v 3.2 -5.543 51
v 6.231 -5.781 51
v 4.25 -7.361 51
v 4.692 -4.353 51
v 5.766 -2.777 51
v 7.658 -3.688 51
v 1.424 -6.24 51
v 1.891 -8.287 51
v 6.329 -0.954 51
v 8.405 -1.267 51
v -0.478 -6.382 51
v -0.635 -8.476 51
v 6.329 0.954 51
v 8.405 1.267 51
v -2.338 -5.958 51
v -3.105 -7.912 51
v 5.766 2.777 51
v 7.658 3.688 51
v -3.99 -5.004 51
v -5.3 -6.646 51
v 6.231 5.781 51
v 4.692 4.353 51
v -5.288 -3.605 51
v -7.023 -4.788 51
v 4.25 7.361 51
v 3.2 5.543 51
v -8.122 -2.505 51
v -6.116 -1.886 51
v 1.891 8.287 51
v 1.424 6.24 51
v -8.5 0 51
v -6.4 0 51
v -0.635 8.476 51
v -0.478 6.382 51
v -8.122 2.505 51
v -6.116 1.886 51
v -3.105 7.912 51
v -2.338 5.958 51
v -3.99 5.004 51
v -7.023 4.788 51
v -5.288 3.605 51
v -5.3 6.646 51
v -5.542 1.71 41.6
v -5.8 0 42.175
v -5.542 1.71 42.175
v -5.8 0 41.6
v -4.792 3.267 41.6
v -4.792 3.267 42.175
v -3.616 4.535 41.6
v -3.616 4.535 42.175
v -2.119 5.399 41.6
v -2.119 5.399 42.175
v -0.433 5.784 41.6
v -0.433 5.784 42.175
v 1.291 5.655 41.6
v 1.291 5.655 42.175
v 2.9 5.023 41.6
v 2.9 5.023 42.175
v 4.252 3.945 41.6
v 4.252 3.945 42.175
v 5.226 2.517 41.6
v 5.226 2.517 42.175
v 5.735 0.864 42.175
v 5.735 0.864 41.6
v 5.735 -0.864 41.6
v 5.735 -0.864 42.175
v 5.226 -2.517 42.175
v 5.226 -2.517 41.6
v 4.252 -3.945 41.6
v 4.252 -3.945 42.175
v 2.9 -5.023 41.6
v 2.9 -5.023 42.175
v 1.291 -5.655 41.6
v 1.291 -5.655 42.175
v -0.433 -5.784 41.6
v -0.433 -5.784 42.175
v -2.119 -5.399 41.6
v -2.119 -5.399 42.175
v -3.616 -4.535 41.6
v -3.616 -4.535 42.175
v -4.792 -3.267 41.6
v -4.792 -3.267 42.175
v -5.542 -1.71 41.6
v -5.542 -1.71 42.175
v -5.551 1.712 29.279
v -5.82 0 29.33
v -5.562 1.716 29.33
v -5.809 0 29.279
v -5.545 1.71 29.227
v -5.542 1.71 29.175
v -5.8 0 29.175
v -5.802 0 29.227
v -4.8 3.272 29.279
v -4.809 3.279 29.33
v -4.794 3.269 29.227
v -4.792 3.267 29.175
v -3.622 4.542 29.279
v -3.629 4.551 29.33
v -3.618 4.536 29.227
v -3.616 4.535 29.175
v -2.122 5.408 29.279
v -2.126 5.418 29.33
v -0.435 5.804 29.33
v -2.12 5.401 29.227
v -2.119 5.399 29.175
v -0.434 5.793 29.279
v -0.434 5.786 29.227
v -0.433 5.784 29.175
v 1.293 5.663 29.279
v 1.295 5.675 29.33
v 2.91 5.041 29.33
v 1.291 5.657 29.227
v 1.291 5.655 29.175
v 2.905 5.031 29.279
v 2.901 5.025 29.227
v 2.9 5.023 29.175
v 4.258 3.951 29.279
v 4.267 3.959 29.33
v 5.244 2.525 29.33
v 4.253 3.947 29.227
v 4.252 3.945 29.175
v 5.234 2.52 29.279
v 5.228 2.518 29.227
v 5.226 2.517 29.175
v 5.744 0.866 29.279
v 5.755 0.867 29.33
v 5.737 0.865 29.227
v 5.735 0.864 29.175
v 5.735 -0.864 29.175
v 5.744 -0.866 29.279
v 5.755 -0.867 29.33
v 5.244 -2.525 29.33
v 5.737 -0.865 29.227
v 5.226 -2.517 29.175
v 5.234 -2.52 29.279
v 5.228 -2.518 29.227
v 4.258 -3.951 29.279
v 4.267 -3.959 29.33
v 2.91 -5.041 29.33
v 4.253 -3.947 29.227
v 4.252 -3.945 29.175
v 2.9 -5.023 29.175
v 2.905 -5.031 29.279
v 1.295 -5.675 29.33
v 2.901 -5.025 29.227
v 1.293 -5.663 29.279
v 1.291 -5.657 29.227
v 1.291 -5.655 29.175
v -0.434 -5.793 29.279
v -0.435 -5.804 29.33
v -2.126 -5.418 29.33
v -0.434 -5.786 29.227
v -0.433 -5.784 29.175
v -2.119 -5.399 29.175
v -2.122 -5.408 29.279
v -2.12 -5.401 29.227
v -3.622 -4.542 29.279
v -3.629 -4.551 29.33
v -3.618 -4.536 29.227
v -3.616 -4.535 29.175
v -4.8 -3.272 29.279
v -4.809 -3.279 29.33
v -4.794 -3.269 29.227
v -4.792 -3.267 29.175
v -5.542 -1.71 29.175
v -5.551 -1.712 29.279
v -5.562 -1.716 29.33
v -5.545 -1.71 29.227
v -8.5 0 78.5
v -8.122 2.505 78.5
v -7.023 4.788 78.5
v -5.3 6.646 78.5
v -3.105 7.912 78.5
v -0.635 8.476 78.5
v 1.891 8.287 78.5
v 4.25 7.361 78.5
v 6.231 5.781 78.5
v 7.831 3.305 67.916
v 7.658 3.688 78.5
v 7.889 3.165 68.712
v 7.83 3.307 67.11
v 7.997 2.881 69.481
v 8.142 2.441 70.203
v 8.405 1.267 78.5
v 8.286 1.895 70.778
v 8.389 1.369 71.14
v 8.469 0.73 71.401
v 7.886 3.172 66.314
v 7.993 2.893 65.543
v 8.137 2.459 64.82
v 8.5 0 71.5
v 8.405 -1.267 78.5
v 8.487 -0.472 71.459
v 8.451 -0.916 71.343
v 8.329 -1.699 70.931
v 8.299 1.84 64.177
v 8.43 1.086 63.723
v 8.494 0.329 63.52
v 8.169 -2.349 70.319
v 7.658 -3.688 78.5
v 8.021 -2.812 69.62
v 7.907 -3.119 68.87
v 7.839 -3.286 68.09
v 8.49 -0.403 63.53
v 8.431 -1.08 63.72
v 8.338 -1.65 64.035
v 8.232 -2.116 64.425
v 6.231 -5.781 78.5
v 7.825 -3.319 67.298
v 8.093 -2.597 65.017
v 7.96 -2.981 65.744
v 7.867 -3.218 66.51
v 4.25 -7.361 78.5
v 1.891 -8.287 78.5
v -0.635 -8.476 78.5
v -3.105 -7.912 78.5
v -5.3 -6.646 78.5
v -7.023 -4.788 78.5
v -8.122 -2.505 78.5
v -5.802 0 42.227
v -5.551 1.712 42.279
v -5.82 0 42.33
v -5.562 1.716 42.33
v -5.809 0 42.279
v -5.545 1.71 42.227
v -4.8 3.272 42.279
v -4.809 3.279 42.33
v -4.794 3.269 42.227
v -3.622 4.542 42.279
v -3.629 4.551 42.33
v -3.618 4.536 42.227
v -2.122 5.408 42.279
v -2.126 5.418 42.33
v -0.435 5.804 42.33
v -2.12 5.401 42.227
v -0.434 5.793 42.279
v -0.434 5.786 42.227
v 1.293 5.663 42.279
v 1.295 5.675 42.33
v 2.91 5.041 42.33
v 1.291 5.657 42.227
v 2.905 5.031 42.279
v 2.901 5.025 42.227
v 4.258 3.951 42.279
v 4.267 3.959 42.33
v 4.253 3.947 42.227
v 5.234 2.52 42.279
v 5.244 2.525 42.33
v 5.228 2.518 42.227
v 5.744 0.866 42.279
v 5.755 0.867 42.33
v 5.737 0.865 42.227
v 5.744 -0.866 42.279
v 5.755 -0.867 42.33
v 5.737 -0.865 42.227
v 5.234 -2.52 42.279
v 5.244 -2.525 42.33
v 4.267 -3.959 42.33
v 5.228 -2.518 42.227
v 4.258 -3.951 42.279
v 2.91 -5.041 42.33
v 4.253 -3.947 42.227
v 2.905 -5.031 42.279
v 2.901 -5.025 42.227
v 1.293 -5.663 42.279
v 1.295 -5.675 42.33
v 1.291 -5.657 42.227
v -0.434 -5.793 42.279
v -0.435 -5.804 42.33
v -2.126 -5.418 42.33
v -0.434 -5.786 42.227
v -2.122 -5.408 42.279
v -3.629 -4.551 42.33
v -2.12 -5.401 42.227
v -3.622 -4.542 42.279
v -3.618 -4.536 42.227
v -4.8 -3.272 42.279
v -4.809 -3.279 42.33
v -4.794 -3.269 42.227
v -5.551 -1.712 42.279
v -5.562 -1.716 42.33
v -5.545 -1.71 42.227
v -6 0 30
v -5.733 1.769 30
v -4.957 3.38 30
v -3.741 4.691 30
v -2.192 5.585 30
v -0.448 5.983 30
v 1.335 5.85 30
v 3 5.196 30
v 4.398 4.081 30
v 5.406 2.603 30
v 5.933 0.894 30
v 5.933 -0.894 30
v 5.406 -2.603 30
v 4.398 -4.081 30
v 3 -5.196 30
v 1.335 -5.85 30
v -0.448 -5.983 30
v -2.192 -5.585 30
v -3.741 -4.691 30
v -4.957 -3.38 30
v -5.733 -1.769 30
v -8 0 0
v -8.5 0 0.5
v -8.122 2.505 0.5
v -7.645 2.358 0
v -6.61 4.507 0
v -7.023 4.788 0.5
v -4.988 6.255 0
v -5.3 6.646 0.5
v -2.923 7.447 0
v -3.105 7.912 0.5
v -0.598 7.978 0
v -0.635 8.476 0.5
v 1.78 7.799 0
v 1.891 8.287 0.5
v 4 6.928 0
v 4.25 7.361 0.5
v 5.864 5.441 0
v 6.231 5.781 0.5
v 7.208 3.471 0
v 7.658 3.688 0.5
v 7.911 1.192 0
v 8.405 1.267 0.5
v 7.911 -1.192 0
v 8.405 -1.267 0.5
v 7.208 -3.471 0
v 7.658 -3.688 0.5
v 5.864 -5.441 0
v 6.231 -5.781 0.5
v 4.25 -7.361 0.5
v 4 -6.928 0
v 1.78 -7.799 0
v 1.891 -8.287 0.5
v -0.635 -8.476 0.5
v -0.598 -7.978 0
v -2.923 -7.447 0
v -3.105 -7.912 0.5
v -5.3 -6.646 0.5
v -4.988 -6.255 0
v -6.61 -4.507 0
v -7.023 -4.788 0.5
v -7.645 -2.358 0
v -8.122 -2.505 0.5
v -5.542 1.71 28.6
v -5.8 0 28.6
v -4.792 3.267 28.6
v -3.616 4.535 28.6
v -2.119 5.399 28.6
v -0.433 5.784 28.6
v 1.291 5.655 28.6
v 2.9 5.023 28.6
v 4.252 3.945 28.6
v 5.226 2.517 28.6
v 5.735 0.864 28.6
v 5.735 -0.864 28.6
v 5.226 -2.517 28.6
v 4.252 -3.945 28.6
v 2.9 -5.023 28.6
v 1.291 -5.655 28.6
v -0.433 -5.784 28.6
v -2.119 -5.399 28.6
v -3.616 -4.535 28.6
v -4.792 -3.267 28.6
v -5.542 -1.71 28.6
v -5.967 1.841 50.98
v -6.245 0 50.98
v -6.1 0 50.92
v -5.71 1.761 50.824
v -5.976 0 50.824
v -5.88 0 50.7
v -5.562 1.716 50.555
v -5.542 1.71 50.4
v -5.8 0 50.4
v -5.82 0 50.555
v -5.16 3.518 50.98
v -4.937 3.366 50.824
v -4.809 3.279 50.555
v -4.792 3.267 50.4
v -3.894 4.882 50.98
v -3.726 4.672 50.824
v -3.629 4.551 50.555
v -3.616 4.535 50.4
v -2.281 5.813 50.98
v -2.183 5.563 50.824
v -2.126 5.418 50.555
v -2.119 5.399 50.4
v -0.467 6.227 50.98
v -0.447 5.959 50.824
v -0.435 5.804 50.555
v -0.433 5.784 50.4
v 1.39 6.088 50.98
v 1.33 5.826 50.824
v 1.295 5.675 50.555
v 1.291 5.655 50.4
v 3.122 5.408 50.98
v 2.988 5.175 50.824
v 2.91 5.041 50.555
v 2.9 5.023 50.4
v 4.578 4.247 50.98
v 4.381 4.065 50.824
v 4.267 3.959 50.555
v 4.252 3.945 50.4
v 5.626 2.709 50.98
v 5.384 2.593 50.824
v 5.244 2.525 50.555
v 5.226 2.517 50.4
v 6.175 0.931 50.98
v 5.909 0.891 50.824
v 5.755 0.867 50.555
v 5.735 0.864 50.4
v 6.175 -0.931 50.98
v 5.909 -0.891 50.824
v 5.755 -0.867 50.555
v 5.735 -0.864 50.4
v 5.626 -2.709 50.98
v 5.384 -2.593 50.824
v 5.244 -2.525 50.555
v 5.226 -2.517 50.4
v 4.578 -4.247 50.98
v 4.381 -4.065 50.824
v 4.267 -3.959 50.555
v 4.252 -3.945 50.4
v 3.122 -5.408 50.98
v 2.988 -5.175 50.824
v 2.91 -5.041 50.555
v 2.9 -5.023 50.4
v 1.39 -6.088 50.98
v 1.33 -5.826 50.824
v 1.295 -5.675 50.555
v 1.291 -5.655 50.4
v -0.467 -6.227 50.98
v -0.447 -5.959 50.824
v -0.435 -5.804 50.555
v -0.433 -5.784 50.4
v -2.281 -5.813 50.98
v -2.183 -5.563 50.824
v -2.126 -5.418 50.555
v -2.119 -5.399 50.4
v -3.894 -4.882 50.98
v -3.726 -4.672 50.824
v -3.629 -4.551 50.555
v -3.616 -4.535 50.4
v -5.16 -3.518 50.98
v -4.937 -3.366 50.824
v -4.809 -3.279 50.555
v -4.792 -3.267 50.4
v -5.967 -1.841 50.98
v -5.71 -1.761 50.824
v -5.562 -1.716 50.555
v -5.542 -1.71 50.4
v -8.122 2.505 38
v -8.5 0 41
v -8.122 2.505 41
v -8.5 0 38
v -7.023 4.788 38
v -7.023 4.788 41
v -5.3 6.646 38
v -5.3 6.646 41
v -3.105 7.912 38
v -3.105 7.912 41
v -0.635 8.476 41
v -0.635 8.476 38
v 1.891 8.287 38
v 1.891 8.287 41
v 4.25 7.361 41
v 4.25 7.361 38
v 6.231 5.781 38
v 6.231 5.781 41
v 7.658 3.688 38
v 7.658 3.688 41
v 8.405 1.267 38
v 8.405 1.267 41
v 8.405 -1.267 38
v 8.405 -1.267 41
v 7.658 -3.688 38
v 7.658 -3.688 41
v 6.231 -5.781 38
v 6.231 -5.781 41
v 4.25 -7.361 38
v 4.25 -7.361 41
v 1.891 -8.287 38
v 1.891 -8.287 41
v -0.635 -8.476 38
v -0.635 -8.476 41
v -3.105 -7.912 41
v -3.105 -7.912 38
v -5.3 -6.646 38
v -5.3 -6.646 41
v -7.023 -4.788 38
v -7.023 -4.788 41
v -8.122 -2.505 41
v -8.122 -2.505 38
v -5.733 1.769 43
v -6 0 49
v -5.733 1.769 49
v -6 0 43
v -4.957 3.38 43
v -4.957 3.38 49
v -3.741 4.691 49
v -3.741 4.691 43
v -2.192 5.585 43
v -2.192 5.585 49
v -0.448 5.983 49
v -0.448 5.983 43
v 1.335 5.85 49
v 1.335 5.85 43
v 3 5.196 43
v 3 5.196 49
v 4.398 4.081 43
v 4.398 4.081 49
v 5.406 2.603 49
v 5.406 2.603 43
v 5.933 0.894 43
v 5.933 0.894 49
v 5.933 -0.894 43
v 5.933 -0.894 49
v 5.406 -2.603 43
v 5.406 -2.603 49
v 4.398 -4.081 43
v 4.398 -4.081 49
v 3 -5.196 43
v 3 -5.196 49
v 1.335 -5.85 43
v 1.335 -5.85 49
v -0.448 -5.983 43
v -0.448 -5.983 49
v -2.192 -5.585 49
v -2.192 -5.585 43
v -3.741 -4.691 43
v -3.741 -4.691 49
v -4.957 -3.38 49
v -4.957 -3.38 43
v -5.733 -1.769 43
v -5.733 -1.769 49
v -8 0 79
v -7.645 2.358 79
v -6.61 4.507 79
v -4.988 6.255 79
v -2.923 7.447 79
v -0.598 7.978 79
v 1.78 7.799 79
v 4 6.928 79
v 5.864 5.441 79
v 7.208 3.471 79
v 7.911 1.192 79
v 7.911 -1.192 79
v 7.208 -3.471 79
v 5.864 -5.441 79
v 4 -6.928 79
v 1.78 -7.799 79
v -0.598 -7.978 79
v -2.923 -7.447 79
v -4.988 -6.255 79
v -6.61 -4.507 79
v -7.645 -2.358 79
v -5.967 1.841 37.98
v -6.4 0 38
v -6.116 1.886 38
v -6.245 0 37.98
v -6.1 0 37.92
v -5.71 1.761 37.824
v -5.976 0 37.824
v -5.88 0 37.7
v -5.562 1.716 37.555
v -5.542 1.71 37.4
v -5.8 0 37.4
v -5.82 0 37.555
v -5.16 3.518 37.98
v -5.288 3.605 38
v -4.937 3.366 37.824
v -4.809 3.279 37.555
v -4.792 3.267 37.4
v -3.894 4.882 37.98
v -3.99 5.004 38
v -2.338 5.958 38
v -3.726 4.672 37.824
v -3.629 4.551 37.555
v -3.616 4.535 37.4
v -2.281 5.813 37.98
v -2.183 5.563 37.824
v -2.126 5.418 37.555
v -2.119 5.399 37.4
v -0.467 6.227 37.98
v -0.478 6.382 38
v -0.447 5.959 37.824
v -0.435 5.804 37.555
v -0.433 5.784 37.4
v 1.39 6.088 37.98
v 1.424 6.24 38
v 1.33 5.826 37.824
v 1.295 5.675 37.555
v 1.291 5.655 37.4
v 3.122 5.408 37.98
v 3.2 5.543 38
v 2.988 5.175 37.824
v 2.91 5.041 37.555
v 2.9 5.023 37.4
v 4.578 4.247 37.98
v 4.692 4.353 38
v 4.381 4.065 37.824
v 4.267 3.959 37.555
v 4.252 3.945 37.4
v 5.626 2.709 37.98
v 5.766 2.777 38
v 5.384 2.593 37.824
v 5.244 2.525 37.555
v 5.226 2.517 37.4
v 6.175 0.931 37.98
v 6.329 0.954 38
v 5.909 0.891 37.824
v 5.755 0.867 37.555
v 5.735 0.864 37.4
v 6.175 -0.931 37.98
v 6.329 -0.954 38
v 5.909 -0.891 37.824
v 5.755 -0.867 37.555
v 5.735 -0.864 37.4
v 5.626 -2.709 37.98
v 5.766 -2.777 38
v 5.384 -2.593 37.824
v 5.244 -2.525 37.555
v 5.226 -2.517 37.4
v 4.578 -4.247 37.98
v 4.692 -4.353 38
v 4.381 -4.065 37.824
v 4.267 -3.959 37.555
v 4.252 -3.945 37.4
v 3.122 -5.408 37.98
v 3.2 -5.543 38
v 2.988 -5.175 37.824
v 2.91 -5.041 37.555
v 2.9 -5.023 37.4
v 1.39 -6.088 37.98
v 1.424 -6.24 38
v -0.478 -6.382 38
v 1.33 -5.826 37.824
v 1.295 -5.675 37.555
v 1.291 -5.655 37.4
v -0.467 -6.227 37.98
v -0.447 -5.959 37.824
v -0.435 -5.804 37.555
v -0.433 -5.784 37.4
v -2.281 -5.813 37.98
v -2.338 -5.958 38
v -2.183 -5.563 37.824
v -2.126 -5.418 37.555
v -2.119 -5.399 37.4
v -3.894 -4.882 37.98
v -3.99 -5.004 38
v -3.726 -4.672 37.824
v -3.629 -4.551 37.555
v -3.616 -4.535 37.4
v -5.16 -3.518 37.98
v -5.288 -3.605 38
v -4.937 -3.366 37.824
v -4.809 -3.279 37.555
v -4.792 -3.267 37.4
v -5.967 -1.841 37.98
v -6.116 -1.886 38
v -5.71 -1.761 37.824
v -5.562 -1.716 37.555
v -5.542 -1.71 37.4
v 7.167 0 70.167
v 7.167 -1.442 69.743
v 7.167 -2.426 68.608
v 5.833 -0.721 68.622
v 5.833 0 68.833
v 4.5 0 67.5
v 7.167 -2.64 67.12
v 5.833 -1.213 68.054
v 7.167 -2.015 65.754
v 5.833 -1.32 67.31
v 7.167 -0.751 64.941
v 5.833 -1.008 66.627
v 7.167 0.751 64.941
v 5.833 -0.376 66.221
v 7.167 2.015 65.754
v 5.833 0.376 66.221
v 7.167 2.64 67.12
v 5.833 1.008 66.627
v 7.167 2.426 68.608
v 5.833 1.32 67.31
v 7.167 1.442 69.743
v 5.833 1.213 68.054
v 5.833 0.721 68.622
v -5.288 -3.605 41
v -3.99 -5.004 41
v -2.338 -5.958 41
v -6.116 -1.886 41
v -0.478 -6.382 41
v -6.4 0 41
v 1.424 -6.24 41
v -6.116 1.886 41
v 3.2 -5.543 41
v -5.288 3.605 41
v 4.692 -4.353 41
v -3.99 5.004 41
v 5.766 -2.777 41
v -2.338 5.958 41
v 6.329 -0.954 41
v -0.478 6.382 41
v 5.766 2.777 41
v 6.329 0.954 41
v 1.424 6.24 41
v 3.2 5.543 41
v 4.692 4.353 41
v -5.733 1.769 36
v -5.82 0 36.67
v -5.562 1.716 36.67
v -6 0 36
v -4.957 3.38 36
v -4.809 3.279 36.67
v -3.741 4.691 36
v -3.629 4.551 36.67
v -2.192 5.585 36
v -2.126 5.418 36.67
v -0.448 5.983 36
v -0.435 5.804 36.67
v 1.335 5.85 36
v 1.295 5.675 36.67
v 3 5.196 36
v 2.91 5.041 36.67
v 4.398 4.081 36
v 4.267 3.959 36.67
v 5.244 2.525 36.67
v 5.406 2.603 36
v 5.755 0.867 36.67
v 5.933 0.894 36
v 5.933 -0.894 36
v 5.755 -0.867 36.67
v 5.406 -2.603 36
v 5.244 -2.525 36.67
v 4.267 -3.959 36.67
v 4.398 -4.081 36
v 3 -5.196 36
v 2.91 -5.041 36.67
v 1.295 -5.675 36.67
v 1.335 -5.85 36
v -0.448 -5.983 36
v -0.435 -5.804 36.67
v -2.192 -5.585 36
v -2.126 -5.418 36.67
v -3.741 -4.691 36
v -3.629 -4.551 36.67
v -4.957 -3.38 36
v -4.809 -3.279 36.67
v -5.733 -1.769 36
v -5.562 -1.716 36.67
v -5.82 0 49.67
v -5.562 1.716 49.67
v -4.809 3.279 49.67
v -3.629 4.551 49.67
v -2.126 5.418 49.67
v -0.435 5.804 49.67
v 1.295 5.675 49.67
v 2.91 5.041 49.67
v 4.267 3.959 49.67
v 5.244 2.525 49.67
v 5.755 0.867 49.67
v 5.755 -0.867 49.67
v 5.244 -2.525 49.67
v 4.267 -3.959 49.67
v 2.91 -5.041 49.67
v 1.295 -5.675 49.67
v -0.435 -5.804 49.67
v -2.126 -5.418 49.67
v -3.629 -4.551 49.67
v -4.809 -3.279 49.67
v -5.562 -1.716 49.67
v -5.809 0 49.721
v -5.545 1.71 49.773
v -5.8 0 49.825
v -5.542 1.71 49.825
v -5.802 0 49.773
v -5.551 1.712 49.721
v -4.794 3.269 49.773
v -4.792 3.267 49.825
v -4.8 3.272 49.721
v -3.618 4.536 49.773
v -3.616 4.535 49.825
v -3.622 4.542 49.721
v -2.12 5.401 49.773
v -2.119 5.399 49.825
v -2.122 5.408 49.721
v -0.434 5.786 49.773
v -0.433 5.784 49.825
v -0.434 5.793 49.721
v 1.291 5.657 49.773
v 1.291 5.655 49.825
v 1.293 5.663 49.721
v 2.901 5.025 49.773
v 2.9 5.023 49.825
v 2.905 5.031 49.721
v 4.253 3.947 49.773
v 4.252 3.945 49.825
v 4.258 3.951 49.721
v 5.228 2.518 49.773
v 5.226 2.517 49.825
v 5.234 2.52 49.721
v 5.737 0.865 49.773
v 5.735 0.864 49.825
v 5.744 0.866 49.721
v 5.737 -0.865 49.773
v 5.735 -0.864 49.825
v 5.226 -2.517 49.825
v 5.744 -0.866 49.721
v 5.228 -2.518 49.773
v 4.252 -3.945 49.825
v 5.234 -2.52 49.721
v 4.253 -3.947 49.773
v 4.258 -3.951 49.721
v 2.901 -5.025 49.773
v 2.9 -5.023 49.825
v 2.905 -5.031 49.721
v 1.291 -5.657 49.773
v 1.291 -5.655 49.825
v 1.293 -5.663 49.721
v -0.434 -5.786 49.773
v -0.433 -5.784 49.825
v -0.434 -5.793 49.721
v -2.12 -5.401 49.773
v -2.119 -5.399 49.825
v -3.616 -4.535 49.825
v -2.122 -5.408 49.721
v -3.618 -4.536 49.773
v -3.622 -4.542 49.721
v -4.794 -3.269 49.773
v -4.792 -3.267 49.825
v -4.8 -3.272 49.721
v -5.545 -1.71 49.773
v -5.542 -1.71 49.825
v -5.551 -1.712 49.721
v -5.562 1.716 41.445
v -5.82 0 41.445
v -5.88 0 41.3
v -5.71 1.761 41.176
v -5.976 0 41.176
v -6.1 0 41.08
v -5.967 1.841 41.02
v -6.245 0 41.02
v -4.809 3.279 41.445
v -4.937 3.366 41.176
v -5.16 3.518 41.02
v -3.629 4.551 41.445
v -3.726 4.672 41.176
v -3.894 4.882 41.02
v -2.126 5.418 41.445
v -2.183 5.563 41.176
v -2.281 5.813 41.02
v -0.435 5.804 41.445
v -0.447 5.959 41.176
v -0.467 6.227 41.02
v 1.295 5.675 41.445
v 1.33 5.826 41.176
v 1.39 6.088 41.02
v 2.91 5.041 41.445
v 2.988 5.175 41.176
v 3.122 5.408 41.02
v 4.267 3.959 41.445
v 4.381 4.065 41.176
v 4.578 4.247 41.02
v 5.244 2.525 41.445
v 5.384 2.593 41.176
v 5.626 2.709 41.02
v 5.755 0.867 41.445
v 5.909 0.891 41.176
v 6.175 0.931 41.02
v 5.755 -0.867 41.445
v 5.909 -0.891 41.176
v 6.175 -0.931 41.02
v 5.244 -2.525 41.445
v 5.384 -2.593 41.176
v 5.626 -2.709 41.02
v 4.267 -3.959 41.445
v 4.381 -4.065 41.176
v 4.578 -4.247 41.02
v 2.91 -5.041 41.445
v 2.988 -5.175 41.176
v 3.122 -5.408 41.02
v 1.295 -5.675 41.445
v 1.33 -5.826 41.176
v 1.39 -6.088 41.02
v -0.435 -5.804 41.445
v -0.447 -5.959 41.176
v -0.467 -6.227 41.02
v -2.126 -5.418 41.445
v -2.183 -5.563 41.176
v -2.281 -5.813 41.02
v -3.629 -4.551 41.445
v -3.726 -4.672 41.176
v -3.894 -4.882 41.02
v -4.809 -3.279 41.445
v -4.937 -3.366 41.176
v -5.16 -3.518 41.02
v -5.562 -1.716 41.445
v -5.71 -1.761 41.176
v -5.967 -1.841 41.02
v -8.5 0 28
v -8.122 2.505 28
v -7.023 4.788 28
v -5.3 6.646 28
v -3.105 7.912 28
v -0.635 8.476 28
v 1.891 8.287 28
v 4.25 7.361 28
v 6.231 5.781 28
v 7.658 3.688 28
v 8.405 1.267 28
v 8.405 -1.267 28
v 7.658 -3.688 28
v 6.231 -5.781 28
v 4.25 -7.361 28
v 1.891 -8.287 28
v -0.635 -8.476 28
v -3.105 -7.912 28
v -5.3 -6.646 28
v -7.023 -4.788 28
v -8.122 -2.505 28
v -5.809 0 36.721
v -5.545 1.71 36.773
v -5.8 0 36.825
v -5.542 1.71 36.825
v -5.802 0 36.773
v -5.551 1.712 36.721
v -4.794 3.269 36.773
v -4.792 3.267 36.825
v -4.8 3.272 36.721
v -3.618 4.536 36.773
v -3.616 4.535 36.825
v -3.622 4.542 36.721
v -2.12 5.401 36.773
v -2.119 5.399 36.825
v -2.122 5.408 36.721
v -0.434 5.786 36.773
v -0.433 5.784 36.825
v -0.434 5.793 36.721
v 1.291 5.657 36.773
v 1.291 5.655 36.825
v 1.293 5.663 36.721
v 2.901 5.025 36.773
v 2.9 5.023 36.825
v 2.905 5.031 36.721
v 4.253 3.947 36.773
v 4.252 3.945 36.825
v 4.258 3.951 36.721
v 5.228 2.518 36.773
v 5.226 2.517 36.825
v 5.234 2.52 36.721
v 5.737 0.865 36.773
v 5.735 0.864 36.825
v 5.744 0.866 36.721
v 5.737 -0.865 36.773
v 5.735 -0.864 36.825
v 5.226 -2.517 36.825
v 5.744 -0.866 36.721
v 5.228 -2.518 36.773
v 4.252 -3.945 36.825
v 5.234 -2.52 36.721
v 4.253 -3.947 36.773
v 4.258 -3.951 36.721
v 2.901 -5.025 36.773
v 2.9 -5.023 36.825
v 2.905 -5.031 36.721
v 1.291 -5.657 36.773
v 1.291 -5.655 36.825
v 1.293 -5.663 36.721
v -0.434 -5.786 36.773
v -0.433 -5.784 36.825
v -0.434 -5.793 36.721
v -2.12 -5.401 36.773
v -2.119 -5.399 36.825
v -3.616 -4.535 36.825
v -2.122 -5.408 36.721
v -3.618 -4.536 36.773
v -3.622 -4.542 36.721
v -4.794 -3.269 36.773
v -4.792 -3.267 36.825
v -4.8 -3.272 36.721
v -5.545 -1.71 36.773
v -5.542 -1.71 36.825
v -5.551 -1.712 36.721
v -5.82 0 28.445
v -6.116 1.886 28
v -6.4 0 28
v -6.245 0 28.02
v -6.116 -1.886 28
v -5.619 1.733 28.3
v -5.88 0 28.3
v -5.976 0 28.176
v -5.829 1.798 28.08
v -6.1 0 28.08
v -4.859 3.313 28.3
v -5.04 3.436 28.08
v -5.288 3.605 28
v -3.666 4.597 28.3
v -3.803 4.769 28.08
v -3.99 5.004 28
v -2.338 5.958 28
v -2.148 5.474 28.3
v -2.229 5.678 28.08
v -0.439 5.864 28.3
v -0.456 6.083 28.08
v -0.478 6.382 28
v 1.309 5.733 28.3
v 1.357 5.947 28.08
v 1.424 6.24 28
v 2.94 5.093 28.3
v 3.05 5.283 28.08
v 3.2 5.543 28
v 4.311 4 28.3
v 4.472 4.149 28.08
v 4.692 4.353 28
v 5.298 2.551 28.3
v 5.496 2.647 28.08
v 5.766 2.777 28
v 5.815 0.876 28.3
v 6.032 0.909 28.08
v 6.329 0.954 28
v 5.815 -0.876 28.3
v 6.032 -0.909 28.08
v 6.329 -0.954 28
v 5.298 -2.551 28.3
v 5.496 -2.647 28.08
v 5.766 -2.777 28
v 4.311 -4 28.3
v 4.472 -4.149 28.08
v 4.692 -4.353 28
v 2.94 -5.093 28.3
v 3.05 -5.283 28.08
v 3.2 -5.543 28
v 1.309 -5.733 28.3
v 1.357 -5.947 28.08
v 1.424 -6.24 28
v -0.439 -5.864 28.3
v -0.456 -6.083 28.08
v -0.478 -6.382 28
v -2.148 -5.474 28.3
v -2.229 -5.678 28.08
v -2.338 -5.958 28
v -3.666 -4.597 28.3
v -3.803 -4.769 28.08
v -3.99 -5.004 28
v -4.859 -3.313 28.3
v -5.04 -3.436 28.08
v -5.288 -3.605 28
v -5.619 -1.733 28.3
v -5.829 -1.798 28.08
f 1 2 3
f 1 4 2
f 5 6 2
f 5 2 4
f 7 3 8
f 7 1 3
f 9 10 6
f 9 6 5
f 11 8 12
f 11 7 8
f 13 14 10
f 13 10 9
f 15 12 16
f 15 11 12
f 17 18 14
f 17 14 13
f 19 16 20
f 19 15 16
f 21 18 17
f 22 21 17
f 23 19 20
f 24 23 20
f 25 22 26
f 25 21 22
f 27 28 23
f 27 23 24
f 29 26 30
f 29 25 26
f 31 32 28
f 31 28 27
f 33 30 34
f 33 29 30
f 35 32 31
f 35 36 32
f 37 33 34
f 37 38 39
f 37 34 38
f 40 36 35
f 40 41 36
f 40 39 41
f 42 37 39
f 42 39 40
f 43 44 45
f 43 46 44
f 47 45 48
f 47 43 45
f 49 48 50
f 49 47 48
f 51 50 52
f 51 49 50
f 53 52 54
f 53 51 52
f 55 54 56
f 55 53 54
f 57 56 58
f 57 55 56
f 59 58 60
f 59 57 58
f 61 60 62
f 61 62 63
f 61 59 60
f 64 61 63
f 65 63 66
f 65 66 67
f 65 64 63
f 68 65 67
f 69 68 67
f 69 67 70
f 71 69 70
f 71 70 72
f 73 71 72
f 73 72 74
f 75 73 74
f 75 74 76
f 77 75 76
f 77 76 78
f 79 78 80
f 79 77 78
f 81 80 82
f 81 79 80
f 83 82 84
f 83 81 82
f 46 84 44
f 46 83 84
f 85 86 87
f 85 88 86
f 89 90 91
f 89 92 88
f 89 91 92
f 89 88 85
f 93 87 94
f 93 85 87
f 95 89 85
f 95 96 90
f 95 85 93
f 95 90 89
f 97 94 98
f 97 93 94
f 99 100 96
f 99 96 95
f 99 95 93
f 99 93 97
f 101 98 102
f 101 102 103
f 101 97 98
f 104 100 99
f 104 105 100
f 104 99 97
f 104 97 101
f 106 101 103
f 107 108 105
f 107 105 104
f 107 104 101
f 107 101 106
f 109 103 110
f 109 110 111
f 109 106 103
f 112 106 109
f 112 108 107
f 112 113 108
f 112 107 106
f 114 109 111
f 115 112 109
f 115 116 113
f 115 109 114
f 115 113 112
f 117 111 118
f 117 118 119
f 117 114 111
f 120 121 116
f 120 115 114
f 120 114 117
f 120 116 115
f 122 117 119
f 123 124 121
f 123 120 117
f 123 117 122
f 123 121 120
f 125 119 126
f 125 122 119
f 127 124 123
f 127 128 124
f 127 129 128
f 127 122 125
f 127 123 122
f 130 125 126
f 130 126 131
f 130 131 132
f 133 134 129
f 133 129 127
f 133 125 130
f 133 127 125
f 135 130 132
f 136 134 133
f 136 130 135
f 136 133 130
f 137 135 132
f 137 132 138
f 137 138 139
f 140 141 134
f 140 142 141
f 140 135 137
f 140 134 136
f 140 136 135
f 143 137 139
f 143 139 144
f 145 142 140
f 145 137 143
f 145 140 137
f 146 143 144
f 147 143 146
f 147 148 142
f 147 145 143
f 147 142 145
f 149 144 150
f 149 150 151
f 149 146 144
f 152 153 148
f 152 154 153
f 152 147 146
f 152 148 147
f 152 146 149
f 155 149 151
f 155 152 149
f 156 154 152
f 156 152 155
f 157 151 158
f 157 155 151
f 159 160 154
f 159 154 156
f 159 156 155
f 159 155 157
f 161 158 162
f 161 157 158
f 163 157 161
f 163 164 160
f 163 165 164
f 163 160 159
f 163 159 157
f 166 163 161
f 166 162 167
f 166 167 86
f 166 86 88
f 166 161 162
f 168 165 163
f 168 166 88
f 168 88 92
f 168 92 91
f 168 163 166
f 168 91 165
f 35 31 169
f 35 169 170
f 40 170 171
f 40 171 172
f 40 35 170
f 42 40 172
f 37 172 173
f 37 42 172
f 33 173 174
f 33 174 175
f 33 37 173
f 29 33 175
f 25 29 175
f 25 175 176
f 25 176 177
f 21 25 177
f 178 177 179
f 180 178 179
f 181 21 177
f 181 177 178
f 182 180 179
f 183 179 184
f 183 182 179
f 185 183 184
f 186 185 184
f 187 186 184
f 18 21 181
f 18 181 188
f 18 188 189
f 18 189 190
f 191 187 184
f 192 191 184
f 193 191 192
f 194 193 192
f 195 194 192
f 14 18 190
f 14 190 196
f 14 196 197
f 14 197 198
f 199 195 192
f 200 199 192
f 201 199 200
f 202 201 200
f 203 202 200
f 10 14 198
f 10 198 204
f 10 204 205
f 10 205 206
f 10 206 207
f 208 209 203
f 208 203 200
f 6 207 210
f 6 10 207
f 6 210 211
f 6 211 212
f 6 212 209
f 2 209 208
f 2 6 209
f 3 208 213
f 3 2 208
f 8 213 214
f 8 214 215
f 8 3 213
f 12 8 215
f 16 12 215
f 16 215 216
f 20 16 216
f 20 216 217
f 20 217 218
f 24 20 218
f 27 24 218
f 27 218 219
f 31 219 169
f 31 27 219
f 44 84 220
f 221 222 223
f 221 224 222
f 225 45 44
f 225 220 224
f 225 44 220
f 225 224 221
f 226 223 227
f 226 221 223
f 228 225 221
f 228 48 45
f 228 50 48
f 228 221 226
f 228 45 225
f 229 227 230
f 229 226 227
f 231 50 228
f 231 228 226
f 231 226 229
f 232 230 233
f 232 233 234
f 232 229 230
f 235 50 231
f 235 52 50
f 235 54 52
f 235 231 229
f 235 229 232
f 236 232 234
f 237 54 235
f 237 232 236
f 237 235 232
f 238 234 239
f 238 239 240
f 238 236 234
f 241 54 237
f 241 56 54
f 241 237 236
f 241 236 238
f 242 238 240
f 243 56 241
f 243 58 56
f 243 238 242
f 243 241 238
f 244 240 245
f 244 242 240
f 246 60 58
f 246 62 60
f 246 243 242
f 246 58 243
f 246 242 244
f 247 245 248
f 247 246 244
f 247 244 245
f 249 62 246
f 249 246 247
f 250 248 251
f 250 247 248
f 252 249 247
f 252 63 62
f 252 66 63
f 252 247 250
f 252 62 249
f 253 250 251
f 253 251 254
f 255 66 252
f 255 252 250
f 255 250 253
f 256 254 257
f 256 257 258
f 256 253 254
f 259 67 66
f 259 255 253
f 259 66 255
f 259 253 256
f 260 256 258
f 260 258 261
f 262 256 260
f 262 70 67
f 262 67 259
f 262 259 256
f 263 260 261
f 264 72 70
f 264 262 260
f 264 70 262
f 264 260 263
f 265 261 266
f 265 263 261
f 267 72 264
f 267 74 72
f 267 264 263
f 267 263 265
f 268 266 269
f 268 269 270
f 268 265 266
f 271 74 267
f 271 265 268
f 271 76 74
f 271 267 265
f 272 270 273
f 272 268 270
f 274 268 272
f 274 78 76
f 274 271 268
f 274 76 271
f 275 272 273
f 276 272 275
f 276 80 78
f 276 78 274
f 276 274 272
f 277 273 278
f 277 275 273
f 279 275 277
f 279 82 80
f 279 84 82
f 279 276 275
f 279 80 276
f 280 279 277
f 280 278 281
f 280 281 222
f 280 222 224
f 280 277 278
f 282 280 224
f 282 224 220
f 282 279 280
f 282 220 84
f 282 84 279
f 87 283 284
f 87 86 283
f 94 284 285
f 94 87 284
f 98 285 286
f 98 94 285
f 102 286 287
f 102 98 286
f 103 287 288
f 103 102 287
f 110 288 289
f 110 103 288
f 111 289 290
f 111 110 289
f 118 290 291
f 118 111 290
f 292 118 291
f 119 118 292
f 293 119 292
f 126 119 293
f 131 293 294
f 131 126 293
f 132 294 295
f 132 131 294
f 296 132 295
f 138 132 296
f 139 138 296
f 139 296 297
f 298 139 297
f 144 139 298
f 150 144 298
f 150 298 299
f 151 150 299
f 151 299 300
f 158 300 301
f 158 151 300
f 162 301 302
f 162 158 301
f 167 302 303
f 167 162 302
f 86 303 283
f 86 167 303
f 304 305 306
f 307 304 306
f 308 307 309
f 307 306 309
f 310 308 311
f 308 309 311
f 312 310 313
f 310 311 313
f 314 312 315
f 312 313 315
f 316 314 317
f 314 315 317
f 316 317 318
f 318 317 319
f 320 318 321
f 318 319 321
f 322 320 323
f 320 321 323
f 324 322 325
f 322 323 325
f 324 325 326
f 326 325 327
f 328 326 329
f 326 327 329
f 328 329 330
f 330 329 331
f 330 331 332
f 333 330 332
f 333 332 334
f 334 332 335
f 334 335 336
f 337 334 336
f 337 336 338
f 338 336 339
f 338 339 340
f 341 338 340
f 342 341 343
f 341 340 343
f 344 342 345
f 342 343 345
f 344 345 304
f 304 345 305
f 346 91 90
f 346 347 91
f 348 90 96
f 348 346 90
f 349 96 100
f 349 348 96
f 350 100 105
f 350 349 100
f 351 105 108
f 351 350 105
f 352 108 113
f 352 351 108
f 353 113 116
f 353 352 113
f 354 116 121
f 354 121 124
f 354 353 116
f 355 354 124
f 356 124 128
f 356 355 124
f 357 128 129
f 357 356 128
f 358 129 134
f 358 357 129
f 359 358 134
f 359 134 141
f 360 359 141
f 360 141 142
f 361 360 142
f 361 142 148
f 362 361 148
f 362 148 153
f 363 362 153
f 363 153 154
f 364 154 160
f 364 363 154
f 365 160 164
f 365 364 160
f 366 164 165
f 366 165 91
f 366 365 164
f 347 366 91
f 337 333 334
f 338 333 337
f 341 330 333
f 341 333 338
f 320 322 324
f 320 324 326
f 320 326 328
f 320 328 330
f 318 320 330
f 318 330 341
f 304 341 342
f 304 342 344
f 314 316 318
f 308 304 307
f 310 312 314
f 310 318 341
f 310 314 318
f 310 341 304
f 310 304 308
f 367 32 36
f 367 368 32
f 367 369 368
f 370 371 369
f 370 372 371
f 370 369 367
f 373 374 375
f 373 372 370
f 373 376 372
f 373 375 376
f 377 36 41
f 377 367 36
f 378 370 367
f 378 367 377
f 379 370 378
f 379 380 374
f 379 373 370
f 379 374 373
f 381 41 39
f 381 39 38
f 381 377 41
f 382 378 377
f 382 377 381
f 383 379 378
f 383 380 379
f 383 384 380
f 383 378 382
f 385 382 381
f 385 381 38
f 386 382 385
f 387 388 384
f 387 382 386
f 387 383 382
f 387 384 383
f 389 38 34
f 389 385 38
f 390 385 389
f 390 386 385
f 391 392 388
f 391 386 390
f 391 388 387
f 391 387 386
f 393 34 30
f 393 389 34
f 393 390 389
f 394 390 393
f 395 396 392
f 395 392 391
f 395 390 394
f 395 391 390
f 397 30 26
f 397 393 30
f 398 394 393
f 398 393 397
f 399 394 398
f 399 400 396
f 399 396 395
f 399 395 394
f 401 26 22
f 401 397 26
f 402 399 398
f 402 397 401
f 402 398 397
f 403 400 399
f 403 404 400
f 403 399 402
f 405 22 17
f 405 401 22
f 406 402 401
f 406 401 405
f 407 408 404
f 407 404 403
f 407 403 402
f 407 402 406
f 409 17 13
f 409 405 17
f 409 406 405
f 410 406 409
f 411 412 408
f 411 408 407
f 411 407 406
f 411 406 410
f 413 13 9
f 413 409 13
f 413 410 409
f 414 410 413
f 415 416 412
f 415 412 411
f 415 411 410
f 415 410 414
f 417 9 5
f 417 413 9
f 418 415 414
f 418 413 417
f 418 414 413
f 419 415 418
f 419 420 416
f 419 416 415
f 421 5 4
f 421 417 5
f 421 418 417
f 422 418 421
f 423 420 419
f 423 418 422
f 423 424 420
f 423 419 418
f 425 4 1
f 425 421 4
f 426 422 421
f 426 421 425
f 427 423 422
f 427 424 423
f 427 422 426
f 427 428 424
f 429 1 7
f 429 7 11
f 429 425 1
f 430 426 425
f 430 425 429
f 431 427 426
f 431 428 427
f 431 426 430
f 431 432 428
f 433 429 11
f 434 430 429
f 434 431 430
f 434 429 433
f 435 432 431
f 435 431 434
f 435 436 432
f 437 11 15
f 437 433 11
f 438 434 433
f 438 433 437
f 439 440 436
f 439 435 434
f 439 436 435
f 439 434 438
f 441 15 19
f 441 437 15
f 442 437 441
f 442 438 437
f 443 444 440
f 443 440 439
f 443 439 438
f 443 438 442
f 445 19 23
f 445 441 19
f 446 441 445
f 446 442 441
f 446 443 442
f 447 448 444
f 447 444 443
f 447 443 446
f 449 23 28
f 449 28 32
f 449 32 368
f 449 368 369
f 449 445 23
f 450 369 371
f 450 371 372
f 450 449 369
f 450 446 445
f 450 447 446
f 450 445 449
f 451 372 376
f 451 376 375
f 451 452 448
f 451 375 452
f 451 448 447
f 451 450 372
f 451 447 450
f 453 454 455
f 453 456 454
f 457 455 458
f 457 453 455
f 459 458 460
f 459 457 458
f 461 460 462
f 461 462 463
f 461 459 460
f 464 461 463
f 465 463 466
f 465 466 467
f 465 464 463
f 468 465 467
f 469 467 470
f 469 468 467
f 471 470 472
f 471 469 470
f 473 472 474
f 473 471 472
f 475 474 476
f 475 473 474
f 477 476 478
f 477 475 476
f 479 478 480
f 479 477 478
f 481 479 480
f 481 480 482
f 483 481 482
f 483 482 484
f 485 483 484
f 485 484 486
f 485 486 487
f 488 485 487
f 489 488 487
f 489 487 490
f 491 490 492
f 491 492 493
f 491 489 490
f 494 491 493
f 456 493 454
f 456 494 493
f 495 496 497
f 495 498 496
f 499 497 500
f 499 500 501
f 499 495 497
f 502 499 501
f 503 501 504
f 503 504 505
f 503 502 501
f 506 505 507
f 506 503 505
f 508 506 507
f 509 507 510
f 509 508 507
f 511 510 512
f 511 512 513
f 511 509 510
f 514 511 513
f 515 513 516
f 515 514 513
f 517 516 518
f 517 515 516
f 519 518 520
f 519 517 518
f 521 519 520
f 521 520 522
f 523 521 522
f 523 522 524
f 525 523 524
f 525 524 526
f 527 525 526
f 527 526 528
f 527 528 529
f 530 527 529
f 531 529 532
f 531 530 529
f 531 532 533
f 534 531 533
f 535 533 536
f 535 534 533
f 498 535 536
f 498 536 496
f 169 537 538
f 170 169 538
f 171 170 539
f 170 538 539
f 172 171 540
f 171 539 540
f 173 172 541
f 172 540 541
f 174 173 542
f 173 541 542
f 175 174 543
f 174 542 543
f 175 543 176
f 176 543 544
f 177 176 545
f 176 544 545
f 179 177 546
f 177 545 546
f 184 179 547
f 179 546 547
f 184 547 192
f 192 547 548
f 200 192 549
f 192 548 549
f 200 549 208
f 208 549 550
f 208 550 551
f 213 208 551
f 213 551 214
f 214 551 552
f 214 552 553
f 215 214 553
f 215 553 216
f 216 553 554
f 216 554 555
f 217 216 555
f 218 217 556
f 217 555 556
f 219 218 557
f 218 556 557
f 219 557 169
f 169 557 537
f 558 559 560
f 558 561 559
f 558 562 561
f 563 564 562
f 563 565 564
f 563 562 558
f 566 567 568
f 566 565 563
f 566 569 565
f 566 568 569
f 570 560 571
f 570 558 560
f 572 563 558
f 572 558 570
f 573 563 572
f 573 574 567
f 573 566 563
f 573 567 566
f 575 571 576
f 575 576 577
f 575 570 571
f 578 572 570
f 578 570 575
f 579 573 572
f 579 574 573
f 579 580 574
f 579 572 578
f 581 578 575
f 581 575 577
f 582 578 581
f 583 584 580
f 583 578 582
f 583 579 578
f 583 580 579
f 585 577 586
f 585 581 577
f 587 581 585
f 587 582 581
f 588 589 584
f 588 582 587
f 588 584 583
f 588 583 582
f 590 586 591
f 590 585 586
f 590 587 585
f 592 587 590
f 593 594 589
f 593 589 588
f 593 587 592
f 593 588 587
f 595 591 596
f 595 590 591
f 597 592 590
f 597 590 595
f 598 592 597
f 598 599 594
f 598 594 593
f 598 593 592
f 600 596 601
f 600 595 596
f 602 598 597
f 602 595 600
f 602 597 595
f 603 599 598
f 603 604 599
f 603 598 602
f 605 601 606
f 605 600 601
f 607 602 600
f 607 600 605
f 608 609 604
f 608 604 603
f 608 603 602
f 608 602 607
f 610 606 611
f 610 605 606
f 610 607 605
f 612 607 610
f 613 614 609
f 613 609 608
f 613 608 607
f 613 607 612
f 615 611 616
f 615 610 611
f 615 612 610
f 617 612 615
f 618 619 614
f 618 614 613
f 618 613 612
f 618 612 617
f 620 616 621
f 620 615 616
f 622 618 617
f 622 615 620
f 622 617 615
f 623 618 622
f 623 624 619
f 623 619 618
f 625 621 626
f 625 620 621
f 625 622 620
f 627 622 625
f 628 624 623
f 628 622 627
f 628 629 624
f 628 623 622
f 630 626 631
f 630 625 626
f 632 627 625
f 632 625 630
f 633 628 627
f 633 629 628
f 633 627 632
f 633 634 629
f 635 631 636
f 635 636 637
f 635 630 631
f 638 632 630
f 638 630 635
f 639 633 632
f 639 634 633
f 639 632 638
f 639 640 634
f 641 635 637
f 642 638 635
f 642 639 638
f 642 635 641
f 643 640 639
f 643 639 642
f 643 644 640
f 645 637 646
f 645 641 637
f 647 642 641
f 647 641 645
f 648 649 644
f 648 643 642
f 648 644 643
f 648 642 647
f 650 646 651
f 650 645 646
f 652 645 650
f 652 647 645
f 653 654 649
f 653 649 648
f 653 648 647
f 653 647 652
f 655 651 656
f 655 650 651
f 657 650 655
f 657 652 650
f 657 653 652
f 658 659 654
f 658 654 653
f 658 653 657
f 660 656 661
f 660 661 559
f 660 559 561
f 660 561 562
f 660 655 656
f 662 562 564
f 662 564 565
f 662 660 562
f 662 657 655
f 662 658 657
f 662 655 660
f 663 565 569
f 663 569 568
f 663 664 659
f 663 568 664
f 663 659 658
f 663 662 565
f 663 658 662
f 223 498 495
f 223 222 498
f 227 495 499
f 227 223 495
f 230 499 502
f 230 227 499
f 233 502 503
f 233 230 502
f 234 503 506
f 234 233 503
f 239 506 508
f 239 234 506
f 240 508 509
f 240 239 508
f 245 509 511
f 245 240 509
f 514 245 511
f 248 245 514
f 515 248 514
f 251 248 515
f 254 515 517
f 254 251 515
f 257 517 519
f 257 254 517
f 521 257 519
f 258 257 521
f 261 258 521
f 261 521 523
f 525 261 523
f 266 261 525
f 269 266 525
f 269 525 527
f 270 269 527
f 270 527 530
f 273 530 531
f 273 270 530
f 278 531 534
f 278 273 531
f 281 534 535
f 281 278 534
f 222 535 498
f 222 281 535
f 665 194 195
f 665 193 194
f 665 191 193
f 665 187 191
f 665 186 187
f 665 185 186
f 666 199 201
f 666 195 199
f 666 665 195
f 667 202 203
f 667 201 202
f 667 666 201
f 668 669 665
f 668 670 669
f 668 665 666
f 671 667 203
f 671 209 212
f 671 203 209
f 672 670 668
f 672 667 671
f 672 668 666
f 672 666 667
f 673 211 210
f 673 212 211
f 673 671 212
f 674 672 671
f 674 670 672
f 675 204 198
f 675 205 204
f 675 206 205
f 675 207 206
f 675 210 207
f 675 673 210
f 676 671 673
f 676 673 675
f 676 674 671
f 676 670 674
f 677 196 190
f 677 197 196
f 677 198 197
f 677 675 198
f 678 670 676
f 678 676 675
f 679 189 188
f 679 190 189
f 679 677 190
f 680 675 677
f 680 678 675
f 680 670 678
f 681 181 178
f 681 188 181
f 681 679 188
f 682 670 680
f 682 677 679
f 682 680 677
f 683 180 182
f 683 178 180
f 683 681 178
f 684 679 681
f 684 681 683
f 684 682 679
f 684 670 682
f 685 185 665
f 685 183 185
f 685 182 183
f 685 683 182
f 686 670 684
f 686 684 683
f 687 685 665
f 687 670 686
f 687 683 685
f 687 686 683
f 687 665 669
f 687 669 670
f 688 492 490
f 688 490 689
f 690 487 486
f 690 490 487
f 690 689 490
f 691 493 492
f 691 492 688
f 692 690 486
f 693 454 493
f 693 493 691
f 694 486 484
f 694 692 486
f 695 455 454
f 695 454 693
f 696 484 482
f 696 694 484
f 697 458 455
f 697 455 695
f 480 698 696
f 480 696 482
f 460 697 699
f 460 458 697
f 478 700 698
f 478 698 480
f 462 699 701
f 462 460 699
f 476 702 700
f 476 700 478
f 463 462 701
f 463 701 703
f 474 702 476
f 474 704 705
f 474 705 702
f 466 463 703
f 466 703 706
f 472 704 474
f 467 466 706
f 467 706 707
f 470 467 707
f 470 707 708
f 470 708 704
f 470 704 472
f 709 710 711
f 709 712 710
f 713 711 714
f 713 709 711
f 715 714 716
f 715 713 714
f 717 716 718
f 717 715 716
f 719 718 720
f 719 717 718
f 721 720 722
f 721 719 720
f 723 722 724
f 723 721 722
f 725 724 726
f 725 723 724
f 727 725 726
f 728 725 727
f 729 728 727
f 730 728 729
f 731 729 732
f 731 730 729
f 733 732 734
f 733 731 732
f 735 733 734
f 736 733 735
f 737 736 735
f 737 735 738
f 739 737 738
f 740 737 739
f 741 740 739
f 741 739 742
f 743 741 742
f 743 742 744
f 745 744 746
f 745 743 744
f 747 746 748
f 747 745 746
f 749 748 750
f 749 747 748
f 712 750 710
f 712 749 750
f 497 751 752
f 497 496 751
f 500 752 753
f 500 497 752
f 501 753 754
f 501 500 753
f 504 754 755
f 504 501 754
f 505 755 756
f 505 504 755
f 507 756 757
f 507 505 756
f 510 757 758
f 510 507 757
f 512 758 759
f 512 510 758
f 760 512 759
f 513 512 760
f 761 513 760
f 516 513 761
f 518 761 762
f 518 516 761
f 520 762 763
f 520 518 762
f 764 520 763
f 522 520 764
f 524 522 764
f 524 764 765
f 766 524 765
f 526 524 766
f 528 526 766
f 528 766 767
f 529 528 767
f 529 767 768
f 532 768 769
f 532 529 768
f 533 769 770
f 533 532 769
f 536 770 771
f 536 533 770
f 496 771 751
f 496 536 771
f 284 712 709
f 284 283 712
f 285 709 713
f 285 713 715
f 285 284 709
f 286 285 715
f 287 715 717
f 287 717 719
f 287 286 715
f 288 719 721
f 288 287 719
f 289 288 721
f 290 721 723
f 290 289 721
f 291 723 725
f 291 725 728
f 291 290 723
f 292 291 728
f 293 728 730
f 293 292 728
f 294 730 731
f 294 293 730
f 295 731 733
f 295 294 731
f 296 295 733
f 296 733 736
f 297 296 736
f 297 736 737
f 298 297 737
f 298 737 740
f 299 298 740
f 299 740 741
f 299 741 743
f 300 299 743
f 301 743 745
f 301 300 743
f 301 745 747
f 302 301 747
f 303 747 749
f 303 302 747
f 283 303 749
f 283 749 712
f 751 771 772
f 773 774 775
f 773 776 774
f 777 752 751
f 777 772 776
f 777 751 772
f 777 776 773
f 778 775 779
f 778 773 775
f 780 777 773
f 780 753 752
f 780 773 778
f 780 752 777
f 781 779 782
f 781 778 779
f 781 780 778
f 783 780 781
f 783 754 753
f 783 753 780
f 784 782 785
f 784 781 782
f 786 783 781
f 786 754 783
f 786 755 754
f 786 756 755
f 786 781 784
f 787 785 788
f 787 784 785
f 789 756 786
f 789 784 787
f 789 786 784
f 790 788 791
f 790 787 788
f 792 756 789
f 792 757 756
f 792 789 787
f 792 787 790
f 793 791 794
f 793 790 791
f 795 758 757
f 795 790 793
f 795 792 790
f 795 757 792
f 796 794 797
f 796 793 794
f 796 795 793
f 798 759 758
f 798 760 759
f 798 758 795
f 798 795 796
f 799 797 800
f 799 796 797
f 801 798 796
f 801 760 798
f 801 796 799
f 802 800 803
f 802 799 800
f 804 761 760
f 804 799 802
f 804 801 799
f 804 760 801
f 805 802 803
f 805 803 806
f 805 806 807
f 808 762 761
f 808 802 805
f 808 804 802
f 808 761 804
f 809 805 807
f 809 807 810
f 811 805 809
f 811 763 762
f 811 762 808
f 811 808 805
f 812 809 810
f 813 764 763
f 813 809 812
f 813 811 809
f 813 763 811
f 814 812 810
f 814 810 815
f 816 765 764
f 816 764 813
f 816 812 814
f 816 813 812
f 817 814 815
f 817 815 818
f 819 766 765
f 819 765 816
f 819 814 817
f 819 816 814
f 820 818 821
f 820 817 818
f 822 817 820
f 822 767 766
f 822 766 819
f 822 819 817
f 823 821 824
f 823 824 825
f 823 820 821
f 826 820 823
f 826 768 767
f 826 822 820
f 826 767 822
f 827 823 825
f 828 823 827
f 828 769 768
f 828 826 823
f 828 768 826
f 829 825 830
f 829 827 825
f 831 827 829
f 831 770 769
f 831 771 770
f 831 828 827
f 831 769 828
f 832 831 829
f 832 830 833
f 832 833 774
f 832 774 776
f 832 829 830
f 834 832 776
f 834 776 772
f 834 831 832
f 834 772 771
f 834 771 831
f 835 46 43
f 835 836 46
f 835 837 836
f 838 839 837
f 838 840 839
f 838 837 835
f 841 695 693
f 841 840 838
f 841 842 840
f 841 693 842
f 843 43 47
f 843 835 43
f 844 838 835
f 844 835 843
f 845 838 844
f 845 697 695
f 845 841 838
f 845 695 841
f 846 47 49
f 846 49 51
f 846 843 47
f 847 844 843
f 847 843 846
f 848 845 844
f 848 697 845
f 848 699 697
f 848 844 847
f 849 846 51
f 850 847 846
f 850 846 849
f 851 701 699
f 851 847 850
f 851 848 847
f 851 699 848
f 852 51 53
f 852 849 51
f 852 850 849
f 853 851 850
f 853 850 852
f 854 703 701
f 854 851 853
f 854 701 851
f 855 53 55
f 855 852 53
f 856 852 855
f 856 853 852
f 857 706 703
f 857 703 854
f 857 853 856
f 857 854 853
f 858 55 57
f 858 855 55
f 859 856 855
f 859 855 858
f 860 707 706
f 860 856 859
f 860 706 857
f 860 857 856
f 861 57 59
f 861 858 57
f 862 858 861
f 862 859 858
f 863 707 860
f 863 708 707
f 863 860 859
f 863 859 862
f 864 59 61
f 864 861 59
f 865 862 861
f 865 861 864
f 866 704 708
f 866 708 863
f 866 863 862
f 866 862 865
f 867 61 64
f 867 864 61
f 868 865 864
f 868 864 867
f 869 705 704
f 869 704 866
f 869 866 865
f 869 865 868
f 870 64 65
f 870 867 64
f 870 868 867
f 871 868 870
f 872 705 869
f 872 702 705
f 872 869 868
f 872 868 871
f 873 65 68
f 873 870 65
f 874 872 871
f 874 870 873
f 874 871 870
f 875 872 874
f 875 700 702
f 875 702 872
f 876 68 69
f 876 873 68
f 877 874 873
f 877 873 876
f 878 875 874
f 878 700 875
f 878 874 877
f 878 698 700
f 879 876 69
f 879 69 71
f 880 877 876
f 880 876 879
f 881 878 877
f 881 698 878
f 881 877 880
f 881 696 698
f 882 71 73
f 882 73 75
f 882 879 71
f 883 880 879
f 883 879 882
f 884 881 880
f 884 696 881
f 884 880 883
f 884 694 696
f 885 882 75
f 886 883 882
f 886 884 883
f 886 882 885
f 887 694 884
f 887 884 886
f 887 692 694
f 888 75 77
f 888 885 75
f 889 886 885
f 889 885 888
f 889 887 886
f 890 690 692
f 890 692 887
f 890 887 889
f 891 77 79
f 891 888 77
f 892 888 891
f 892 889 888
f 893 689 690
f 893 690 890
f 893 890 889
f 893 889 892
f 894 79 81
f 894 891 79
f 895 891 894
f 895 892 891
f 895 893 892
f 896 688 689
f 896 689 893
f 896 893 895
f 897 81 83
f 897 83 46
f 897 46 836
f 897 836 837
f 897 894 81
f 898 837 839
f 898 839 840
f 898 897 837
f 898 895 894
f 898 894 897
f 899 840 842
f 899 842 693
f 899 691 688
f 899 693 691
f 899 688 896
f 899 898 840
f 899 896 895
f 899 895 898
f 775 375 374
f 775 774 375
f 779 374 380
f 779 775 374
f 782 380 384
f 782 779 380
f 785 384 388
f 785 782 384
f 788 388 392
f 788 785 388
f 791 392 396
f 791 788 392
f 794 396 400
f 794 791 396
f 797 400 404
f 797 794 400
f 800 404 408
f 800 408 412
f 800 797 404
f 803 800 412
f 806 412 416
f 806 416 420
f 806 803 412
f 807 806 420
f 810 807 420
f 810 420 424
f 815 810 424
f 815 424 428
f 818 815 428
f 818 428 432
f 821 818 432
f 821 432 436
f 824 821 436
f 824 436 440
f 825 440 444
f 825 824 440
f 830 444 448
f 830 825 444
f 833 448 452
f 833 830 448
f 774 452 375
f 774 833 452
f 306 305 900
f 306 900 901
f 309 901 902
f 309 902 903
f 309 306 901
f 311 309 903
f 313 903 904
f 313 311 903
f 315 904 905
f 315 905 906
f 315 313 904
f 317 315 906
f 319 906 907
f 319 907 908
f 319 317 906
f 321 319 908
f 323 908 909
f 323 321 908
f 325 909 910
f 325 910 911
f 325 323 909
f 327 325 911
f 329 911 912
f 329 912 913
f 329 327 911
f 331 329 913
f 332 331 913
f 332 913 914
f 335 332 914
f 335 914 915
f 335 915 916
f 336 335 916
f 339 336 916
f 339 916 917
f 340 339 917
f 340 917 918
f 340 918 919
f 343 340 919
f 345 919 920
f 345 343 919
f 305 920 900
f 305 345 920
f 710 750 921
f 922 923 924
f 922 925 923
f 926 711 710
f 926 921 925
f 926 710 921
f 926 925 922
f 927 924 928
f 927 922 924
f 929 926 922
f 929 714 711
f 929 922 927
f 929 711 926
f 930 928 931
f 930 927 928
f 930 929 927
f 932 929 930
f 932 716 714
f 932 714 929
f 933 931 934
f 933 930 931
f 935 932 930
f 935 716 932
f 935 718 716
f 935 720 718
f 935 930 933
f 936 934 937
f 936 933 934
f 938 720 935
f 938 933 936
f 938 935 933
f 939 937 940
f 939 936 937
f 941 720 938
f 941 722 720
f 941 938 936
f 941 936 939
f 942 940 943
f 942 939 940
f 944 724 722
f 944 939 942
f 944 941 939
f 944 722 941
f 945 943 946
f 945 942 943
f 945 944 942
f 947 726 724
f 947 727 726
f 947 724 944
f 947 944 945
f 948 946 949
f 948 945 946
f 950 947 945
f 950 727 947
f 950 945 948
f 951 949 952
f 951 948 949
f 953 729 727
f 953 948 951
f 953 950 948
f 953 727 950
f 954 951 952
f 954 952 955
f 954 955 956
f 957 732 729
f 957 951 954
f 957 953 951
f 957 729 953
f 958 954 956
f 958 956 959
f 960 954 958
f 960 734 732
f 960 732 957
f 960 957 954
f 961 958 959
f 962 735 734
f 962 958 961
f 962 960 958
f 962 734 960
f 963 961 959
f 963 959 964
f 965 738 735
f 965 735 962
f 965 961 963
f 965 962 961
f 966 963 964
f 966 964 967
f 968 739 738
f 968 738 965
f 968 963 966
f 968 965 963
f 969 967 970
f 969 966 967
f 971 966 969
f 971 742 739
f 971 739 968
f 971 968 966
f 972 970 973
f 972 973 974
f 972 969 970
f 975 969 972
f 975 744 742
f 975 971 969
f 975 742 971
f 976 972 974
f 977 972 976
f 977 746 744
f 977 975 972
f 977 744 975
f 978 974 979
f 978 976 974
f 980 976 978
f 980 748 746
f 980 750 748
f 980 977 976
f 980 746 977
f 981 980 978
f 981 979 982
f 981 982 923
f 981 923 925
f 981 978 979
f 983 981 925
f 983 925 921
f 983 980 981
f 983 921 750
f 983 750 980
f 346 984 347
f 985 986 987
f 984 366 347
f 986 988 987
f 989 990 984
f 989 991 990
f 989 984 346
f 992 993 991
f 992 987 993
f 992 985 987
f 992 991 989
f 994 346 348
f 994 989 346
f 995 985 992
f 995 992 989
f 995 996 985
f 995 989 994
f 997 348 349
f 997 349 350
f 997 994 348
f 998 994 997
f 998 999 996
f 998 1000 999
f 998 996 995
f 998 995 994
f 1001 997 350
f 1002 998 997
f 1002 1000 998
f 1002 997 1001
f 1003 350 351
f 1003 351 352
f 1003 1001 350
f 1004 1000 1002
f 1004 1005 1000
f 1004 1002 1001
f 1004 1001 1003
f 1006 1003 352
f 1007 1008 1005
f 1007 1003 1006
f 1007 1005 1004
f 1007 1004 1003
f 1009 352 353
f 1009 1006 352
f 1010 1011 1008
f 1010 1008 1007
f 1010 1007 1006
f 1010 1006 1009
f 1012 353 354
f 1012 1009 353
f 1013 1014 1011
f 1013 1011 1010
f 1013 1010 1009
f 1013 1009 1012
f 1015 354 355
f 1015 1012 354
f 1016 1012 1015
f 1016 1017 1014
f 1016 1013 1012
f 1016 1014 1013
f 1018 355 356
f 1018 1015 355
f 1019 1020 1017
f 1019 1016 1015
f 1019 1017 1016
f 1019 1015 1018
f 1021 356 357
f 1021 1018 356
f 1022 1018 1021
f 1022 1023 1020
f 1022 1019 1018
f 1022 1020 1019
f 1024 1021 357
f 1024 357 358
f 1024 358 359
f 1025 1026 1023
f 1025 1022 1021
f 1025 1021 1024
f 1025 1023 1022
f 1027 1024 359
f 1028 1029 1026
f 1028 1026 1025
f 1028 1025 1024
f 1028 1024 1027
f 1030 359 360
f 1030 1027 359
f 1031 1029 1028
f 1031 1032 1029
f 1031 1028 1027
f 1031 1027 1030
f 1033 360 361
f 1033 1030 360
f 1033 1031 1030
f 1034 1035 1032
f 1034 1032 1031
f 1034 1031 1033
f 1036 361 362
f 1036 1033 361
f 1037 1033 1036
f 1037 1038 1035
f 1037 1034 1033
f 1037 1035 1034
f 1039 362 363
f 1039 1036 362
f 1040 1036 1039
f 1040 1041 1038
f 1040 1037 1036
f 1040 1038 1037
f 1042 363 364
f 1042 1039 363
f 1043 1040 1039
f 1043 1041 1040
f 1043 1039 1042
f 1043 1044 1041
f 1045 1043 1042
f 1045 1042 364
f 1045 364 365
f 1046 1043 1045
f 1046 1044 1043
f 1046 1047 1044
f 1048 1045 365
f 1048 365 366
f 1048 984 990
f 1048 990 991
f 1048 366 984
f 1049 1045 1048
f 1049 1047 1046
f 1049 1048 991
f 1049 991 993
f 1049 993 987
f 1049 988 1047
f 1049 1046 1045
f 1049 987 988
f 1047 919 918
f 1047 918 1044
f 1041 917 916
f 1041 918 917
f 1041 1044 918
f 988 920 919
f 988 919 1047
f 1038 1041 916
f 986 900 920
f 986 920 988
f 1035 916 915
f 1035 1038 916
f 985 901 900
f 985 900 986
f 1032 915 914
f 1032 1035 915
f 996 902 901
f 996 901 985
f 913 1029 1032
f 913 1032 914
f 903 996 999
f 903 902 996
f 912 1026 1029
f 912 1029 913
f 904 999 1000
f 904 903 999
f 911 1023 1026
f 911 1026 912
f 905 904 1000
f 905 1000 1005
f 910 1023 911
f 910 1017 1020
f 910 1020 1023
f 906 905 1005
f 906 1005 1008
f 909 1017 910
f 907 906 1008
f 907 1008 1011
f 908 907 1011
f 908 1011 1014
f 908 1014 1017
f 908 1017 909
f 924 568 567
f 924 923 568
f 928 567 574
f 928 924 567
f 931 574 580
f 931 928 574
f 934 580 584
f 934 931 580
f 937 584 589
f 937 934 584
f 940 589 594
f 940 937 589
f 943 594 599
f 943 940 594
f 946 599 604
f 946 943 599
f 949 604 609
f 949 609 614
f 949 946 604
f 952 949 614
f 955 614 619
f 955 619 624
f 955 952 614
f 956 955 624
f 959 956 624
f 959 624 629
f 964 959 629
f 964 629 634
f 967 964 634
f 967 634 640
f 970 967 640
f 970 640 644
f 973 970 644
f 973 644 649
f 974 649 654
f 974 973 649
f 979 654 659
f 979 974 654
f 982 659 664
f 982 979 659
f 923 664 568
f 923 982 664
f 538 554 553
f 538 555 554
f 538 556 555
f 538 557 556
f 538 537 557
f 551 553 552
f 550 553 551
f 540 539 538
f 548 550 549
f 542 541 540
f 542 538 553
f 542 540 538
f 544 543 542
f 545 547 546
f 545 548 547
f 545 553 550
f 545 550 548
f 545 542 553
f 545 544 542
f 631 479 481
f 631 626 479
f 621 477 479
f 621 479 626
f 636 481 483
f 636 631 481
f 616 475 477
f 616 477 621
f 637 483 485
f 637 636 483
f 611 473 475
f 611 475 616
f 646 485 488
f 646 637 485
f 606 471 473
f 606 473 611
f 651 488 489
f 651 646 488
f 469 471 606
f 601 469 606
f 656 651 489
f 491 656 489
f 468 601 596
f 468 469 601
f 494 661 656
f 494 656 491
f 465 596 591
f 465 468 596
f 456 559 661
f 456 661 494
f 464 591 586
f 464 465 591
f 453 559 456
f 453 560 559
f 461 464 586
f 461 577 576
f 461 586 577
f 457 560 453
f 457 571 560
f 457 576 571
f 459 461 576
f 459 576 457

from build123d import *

# Parameters (mm, degrees)
F4_SIZE = 0.5


with BuildPart() as f1:
    # F0 (on Front) → F1 (revolve)
    with BuildSketch(Plane.XZ):
        with BuildLine():
            Line((-8.5, 0), (0, 0))
            Line((0, 0), (0, 79))
            Line((0, 79), (-8.5, 79))
            Line((-8.5, 79), (-8.5, 51))
            Line((-8.5, 51), (-6.4, 51))
            ThreePointArc((-6.4, 51), (-5.975736, 50.824264), (-5.8, 50.4))
            Line((-5.8, 50.4), (-5.8, 49.825402))
            ThreePointArc((-5.8, 49.825402), (-5.805133, 49.747086), (-5.820445, 49.67011))
            Line((-5.820445, 49.67011), (-6, 49))
            Line((-6, 49), (-6, 43))
            Line((-6, 43), (-5.820445, 42.32989))
            ThreePointArc((-5.820445, 42.32989), (-5.805133, 42.252914), (-5.8, 42.174598))
            Line((-5.8, 42.174598), (-5.8, 41.6))
            ThreePointArc((-5.8, 41.6), (-5.975736, 41.175736), (-6.4, 41))
            Line((-6.4, 41), (-8.5, 41))
            Line((-8.5, 41), (-8.5, 38))
            Line((-8.5, 38), (-6.4, 38))
            ThreePointArc((-6.4, 38), (-5.975736, 37.824264), (-5.8, 37.4))
            Line((-5.8, 37.4), (-5.8, 36.825402))
            ThreePointArc((-5.8, 36.825402), (-5.805133, 36.747086), (-5.820445, 36.67011))
            Line((-5.820445, 36.67011), (-6, 36))
            Line((-6, 36), (-6, 30))
            Line((-6, 30), (-5.820445, 29.32989))
            ThreePointArc((-5.820445, 29.32989), (-5.805133, 29.252914), (-5.8, 29.174598))
            Line((-5.8, 29.174598), (-5.8, 28.6))
            ThreePointArc((-5.8, 28.6), (-5.975736, 28.175736), (-6.4, 28))
            Line((-6.4, 28), (-8.5, 28))
            Line((-8.5, 28), (-8.5, 0))
        make_face()
    revolve(axis=Axis((0, 0, 39.5), (0, 0, -1)))

    # F2 (on Front) → F3 (revolve, cut)
    with BuildSketch(Plane.XZ):
        Polygon((8.5, 67.5), (8.5, 71.5), (4.5, 67.5), align=None)
    revolve(axis=Axis((1.375147, 0, 67.5), (1, 0, 0)), mode=Mode.SUBTRACT)

    # F4
    f4_edges = [f1.edges().sort_by_distance(p)[0] for p in [
        (8.5, 0, 79),
        (8.5, 0, 0),
    ]]
    chamfer(f4_edges, length=F4_SIZE)


solid = f1.part
